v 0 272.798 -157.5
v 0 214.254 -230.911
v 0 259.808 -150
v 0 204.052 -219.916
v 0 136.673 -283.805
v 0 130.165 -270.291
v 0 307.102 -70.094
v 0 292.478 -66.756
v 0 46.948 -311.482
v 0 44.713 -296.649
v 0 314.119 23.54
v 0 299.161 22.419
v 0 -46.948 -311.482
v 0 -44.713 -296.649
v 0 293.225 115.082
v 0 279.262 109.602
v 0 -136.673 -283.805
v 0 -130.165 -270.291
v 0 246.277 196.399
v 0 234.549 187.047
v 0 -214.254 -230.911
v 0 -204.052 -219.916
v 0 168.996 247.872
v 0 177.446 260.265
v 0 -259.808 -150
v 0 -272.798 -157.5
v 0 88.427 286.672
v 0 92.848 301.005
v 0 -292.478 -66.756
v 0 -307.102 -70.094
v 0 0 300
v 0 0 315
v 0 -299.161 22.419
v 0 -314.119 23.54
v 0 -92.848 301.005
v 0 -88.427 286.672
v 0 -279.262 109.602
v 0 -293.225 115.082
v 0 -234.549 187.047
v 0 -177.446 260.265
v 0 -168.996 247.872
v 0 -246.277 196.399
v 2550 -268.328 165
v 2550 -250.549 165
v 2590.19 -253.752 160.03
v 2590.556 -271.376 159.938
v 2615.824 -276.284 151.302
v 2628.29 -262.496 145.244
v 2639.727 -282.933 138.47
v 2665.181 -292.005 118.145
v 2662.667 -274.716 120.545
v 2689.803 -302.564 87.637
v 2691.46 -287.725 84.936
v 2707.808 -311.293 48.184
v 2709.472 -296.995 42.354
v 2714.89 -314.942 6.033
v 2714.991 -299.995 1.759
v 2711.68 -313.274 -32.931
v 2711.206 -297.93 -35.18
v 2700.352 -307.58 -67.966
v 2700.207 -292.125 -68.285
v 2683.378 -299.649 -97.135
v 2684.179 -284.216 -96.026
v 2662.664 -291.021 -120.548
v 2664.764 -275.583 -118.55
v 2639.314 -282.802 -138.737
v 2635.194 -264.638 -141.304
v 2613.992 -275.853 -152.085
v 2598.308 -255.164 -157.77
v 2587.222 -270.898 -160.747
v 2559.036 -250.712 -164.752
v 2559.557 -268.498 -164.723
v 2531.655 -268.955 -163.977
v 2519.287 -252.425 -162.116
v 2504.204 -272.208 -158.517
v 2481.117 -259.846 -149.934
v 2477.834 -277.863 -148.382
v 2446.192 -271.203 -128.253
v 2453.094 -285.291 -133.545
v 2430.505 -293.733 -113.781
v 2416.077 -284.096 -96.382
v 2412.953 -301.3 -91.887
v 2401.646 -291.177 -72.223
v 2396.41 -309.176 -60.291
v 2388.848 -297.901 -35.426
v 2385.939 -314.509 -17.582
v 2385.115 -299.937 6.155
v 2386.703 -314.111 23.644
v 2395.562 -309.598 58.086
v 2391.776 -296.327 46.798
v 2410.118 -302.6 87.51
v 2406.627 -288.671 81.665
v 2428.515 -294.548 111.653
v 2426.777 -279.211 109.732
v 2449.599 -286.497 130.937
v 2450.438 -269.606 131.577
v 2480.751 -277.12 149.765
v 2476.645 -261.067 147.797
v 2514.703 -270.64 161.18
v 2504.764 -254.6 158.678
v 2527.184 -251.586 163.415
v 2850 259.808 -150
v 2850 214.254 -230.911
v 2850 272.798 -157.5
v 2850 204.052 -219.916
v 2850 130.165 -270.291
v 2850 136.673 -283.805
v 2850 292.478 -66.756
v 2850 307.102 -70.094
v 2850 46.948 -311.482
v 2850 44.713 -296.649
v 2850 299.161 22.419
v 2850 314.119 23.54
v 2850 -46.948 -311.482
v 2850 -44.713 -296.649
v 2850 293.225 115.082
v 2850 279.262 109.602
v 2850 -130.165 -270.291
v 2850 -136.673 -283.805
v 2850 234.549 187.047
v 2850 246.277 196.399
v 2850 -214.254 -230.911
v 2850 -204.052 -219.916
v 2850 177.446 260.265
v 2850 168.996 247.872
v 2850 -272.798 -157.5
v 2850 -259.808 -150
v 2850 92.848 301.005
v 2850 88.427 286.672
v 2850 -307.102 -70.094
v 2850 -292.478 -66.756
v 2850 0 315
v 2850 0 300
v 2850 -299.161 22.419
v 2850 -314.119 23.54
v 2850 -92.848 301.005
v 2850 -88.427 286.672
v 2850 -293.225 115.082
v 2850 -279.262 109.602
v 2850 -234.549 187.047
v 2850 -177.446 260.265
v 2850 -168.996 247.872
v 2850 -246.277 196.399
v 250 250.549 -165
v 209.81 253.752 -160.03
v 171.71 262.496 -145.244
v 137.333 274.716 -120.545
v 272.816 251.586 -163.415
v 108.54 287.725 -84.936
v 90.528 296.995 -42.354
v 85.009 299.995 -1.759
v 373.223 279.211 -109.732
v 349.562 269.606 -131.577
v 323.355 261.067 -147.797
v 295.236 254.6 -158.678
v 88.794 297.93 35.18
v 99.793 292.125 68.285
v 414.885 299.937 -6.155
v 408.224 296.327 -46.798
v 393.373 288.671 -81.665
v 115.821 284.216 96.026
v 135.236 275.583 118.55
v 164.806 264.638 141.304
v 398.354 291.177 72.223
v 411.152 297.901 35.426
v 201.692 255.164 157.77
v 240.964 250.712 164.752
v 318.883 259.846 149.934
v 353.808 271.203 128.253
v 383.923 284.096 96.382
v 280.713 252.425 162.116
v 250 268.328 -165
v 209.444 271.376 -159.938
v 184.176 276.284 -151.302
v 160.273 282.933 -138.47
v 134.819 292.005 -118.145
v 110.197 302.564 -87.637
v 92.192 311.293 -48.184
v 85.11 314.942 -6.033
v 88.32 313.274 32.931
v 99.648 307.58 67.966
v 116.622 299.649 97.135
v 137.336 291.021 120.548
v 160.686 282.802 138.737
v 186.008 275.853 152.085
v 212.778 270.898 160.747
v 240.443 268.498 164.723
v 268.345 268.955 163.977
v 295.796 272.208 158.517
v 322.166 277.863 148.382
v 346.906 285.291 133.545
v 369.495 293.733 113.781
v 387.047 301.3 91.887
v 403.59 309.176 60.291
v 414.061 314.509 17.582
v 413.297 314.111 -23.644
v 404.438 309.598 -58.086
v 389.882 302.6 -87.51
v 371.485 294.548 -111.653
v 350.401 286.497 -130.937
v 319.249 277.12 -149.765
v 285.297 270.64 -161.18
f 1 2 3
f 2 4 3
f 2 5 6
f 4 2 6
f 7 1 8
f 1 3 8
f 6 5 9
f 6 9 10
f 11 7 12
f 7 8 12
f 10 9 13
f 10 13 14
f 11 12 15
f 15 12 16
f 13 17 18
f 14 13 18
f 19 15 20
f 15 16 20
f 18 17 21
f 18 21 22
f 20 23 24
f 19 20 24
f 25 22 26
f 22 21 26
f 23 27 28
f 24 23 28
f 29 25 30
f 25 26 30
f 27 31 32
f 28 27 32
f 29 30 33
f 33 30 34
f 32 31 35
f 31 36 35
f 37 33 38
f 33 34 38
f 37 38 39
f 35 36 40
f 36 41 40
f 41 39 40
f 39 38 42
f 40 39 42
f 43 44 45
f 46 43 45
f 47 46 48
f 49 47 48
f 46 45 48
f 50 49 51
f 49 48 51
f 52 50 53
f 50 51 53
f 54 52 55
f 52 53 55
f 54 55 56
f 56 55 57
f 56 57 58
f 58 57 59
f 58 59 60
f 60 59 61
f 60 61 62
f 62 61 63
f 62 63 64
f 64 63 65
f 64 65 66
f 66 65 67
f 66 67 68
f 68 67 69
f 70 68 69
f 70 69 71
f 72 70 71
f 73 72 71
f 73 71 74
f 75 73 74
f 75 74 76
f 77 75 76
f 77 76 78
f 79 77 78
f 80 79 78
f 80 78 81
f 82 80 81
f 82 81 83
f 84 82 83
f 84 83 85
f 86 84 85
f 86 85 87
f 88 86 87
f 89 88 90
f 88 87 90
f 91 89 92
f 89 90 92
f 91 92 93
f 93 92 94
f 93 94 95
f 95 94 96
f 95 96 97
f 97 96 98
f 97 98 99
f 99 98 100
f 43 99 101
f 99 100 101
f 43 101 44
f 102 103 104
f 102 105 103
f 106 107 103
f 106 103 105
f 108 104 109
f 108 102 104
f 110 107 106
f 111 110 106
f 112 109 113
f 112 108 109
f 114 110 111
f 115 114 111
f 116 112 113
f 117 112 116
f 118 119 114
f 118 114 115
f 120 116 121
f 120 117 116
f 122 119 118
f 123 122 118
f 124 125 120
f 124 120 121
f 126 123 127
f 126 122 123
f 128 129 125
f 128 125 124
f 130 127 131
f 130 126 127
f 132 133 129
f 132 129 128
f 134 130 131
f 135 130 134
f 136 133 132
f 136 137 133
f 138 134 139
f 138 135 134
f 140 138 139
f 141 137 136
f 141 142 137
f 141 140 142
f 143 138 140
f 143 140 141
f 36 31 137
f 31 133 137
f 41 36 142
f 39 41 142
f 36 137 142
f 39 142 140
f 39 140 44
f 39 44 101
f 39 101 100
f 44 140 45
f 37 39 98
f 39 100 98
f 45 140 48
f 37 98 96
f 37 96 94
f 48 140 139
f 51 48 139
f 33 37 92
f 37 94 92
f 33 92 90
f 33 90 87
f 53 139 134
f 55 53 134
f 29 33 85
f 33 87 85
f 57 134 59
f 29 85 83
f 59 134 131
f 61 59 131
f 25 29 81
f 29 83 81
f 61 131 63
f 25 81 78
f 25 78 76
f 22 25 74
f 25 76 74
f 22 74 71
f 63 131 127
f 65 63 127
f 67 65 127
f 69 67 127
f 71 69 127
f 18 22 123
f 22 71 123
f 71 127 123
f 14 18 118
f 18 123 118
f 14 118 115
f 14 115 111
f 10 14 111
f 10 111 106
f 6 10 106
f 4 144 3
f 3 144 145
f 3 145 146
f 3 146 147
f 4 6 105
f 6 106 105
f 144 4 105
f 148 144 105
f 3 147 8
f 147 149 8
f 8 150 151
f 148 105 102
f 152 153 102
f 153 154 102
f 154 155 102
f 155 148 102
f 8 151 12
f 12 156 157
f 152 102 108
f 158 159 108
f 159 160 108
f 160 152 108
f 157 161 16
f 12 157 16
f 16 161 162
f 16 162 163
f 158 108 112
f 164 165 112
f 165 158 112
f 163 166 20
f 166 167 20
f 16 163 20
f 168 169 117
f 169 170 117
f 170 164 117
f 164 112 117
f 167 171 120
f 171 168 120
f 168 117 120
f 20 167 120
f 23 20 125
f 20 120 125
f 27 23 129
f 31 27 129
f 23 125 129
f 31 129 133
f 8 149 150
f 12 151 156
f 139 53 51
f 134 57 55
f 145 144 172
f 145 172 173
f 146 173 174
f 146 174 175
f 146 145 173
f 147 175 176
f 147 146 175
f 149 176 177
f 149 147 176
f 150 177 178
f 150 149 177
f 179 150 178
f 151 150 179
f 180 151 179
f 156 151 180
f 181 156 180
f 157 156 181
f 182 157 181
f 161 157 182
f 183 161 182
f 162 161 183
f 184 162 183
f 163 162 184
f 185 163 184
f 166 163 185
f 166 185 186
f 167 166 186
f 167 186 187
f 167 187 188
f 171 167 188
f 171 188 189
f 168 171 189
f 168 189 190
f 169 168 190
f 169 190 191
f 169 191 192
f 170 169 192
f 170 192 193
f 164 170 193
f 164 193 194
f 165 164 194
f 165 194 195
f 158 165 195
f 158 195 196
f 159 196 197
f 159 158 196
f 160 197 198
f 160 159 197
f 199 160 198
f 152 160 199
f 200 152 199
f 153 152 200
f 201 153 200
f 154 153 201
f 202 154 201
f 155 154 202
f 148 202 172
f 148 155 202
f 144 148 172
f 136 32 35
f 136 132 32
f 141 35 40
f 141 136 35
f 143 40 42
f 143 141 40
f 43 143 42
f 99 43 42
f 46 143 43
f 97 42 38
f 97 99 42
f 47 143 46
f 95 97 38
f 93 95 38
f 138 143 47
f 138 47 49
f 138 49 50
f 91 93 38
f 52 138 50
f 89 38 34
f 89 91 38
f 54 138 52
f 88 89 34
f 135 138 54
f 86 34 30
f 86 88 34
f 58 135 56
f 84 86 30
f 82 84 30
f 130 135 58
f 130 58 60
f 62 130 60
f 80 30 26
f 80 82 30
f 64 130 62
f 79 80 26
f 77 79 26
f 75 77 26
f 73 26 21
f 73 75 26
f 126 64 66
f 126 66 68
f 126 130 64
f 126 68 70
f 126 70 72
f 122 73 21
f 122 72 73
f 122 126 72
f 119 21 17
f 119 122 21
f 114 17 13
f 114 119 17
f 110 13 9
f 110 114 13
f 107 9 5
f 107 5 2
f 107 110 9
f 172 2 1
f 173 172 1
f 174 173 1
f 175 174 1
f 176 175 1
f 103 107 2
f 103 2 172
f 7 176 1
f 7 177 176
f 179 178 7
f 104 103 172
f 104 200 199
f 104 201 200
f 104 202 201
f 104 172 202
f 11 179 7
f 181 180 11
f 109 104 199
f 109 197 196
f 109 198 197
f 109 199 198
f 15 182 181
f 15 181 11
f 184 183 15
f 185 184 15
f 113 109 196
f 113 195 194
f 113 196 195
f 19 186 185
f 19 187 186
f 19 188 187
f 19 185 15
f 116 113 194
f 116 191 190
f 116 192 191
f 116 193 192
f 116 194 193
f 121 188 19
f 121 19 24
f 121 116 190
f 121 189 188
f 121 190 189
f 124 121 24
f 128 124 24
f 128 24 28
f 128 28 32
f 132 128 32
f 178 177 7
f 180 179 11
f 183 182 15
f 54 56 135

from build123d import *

# Parameters (mm, degrees)
SKETCH_1_W          = 2850
SKETCH_1_H          = 15
SKETCH_2_R          = 165
CUT_EXTRUDE_1_DEPTH = 2885.605692291
SKETCH_3_R          = 165
CUT_EXTRUDE_2_DEPTH = 2885.605692412


with BuildPart() as part:
    # Эскиз1 → Повернуть1 (revolve)
    with BuildSketch(Plane.XY, mode=Mode.PRIVATE) as revolve_1_sk:
        with Locations((1425, -307.5)):
            Rectangle(SKETCH_1_W, SKETCH_1_H)
    revolve(revolve_1_sk.sketch.rotate(Axis((0, 0, 0), (1, 0, 0)), 270), axis=Axis((0, 0, 0), (1, 0, 0)))

    # Эскиз2 → Вырез-Вытянуть1 (cut, through all)
    with BuildSketch(Plane(origin=(0, 0, 0), x_dir=(1, 0, 0), z_dir=(0, 1, 0))):
        with Locations(Location((250, 0, 0), (0, 0, 90))):
            Circle(SKETCH_2_R)
    extrude(amount=CUT_EXTRUDE_1_DEPTH, mode=Mode.SUBTRACT)

    # Эскиз3 → Вырез-Вытянуть2 (cut, through all)
    with BuildSketch(Plane(origin=(0, 0, 0), x_dir=(1, 0, 0), z_dir=(0, 1, 0))):
        with Locations(Location((2550, 0, 0), (0, 0, 270))):
            Circle(SKETCH_3_R)
    extrude(amount=-CUT_EXTRUDE_2_DEPTH, mode=Mode.SUBTRACT)


solid = part.part
